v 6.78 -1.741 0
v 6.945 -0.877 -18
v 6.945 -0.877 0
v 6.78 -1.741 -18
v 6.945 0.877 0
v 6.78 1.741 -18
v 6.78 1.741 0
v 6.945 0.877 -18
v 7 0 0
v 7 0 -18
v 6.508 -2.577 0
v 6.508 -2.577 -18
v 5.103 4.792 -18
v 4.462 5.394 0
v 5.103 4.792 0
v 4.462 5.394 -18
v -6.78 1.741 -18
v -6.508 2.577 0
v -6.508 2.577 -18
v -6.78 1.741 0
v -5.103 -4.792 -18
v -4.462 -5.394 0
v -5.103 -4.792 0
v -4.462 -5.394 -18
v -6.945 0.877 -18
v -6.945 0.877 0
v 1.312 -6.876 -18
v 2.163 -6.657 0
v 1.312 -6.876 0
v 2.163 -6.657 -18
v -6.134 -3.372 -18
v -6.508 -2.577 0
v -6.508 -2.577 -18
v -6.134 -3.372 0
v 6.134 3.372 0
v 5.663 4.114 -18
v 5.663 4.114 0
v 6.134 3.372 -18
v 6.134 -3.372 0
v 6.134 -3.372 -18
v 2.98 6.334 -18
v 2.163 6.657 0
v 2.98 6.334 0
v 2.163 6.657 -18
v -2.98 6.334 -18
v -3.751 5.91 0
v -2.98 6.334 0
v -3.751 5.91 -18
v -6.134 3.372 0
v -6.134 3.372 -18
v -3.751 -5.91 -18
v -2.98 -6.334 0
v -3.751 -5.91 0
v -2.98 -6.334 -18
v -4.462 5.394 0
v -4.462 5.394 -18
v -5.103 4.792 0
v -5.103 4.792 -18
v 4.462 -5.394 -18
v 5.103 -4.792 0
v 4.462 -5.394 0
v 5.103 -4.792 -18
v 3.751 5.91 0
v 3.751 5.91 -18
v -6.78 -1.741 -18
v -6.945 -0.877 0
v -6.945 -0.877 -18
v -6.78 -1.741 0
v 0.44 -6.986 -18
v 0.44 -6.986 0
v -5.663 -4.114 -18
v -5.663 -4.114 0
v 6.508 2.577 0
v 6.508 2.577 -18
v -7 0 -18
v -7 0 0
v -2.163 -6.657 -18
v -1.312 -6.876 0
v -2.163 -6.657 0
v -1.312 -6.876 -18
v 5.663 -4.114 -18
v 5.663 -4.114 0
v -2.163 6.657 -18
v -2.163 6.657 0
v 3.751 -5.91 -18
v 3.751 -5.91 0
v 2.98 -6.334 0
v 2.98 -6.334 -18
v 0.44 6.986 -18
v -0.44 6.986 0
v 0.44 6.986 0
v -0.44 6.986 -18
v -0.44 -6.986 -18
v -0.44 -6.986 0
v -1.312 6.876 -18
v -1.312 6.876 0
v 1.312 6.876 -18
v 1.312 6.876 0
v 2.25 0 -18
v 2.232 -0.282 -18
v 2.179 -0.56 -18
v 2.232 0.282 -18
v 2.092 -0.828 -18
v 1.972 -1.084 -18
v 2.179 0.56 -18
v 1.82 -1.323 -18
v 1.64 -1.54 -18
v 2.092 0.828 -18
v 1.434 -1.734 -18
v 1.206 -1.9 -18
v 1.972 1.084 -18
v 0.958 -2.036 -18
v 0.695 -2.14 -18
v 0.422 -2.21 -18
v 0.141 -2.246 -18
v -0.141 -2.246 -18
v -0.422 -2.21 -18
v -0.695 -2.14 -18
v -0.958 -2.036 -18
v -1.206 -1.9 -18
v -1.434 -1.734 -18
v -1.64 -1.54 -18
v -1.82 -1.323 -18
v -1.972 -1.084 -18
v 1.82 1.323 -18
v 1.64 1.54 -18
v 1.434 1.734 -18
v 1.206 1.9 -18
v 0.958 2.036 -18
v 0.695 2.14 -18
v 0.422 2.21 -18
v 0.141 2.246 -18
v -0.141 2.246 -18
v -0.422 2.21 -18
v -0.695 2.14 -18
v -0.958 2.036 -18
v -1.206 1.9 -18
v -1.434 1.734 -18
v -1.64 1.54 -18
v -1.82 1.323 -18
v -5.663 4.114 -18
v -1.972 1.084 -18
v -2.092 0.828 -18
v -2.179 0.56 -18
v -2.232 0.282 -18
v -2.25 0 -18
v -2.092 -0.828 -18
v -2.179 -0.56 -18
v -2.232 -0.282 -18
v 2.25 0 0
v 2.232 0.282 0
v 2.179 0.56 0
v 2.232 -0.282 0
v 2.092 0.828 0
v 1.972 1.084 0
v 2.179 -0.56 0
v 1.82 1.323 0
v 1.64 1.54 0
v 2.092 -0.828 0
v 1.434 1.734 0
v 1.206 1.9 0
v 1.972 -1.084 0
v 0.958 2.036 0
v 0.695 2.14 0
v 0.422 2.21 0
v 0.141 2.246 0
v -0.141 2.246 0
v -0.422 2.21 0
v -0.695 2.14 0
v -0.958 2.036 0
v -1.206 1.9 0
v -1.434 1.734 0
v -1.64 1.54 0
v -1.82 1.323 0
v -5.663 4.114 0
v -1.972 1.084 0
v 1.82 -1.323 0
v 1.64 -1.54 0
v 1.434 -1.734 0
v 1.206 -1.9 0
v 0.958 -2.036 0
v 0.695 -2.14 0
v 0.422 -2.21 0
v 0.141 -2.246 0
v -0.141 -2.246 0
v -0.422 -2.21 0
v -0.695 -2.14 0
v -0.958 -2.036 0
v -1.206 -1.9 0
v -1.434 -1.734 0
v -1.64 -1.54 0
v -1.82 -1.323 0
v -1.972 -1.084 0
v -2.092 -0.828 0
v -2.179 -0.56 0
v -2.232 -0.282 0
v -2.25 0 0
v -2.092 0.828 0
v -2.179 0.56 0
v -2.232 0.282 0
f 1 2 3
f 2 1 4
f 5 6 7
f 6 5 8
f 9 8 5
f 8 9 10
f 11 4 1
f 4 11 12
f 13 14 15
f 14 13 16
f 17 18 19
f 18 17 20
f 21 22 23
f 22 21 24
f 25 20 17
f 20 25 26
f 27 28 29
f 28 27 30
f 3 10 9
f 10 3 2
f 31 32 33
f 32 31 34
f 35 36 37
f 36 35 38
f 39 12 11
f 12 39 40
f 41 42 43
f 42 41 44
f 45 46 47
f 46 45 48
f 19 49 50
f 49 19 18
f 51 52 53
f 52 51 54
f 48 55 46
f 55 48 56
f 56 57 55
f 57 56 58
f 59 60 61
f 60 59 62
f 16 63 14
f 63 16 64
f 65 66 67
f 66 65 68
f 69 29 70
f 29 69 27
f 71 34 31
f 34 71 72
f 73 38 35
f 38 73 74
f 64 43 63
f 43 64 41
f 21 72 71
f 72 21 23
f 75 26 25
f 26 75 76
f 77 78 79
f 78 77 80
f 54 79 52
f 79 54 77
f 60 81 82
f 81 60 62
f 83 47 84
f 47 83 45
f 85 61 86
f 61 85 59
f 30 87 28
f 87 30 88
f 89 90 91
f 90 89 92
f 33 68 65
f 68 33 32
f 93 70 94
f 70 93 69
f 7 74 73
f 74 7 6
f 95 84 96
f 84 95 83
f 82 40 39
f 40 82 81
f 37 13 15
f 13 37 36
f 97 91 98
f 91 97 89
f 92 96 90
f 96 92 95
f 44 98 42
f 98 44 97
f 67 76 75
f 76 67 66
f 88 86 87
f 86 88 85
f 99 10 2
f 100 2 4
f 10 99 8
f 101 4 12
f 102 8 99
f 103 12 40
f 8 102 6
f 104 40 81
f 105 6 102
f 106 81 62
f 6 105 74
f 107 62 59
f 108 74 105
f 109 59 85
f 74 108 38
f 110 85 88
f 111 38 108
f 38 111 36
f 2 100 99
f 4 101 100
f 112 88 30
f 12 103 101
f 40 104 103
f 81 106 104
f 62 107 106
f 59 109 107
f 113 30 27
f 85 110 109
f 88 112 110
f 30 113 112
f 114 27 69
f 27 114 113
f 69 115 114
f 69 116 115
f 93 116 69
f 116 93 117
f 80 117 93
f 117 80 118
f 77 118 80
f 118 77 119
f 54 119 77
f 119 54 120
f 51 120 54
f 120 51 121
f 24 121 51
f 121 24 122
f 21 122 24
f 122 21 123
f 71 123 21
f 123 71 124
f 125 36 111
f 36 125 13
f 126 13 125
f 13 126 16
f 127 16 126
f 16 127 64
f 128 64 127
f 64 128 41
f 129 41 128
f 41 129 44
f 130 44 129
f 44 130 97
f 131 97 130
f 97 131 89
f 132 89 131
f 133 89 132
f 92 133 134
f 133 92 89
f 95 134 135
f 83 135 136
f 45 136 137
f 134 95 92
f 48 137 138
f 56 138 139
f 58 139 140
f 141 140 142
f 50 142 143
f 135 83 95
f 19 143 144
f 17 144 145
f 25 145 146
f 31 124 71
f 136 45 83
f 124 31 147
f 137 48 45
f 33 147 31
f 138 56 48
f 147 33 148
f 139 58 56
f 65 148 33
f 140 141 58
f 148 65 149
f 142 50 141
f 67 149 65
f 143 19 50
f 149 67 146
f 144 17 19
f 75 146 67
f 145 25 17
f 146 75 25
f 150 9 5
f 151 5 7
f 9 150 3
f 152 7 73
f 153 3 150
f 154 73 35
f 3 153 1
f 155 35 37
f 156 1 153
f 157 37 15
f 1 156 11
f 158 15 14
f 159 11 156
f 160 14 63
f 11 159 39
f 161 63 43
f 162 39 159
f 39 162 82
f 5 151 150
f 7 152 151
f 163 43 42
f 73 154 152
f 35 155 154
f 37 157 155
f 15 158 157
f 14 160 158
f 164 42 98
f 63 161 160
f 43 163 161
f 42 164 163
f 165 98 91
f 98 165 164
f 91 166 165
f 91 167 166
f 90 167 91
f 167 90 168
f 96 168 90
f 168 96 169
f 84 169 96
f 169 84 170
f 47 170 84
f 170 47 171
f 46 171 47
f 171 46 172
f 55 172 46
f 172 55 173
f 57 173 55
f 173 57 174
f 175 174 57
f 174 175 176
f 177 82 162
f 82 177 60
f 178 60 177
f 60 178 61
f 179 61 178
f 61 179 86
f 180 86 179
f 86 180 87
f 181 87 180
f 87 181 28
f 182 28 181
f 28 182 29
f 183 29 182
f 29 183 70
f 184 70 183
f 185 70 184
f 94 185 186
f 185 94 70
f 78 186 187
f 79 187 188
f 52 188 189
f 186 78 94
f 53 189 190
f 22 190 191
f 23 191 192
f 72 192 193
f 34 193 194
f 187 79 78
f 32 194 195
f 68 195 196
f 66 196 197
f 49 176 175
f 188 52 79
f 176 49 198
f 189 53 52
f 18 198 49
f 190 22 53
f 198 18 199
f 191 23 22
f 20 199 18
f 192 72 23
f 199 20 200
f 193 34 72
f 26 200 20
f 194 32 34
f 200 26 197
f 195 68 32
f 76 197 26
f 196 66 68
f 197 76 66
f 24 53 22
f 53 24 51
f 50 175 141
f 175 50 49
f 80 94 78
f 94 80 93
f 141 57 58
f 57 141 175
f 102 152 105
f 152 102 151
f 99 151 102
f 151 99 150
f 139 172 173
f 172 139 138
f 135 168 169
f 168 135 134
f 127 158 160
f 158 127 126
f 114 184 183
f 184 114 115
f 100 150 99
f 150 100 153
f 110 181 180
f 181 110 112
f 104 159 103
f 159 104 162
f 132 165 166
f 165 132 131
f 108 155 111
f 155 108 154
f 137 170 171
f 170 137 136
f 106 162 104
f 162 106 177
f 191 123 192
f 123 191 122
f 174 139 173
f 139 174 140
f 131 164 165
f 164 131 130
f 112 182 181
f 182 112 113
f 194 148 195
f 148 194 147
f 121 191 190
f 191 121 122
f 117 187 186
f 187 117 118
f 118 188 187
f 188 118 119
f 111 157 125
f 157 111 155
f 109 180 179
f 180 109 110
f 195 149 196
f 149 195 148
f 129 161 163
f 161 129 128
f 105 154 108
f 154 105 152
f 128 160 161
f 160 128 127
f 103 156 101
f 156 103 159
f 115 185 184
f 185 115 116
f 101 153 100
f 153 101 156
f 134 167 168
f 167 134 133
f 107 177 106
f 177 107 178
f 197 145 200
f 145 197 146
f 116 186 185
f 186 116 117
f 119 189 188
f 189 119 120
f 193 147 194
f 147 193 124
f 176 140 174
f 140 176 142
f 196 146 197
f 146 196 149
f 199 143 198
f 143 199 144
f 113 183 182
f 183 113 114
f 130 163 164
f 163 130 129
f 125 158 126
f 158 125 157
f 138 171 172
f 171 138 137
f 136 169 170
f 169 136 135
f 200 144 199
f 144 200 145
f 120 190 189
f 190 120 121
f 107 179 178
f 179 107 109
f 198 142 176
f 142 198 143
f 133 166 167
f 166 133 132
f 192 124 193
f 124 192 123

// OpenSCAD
$fn = 50;


difference() {
	union() {
		translate(v = [0, 0, -18.0000000000]) {
			cylinder(h = 18, r = 7.0000000000);
		}
		cylinder(h = 0, r = 17.0000000000);
	}
	union() {
		#translate(v = [0, 0, -18]) {
			cylinder(h = 18, r = 2.2500000000);
		}
	}
}
